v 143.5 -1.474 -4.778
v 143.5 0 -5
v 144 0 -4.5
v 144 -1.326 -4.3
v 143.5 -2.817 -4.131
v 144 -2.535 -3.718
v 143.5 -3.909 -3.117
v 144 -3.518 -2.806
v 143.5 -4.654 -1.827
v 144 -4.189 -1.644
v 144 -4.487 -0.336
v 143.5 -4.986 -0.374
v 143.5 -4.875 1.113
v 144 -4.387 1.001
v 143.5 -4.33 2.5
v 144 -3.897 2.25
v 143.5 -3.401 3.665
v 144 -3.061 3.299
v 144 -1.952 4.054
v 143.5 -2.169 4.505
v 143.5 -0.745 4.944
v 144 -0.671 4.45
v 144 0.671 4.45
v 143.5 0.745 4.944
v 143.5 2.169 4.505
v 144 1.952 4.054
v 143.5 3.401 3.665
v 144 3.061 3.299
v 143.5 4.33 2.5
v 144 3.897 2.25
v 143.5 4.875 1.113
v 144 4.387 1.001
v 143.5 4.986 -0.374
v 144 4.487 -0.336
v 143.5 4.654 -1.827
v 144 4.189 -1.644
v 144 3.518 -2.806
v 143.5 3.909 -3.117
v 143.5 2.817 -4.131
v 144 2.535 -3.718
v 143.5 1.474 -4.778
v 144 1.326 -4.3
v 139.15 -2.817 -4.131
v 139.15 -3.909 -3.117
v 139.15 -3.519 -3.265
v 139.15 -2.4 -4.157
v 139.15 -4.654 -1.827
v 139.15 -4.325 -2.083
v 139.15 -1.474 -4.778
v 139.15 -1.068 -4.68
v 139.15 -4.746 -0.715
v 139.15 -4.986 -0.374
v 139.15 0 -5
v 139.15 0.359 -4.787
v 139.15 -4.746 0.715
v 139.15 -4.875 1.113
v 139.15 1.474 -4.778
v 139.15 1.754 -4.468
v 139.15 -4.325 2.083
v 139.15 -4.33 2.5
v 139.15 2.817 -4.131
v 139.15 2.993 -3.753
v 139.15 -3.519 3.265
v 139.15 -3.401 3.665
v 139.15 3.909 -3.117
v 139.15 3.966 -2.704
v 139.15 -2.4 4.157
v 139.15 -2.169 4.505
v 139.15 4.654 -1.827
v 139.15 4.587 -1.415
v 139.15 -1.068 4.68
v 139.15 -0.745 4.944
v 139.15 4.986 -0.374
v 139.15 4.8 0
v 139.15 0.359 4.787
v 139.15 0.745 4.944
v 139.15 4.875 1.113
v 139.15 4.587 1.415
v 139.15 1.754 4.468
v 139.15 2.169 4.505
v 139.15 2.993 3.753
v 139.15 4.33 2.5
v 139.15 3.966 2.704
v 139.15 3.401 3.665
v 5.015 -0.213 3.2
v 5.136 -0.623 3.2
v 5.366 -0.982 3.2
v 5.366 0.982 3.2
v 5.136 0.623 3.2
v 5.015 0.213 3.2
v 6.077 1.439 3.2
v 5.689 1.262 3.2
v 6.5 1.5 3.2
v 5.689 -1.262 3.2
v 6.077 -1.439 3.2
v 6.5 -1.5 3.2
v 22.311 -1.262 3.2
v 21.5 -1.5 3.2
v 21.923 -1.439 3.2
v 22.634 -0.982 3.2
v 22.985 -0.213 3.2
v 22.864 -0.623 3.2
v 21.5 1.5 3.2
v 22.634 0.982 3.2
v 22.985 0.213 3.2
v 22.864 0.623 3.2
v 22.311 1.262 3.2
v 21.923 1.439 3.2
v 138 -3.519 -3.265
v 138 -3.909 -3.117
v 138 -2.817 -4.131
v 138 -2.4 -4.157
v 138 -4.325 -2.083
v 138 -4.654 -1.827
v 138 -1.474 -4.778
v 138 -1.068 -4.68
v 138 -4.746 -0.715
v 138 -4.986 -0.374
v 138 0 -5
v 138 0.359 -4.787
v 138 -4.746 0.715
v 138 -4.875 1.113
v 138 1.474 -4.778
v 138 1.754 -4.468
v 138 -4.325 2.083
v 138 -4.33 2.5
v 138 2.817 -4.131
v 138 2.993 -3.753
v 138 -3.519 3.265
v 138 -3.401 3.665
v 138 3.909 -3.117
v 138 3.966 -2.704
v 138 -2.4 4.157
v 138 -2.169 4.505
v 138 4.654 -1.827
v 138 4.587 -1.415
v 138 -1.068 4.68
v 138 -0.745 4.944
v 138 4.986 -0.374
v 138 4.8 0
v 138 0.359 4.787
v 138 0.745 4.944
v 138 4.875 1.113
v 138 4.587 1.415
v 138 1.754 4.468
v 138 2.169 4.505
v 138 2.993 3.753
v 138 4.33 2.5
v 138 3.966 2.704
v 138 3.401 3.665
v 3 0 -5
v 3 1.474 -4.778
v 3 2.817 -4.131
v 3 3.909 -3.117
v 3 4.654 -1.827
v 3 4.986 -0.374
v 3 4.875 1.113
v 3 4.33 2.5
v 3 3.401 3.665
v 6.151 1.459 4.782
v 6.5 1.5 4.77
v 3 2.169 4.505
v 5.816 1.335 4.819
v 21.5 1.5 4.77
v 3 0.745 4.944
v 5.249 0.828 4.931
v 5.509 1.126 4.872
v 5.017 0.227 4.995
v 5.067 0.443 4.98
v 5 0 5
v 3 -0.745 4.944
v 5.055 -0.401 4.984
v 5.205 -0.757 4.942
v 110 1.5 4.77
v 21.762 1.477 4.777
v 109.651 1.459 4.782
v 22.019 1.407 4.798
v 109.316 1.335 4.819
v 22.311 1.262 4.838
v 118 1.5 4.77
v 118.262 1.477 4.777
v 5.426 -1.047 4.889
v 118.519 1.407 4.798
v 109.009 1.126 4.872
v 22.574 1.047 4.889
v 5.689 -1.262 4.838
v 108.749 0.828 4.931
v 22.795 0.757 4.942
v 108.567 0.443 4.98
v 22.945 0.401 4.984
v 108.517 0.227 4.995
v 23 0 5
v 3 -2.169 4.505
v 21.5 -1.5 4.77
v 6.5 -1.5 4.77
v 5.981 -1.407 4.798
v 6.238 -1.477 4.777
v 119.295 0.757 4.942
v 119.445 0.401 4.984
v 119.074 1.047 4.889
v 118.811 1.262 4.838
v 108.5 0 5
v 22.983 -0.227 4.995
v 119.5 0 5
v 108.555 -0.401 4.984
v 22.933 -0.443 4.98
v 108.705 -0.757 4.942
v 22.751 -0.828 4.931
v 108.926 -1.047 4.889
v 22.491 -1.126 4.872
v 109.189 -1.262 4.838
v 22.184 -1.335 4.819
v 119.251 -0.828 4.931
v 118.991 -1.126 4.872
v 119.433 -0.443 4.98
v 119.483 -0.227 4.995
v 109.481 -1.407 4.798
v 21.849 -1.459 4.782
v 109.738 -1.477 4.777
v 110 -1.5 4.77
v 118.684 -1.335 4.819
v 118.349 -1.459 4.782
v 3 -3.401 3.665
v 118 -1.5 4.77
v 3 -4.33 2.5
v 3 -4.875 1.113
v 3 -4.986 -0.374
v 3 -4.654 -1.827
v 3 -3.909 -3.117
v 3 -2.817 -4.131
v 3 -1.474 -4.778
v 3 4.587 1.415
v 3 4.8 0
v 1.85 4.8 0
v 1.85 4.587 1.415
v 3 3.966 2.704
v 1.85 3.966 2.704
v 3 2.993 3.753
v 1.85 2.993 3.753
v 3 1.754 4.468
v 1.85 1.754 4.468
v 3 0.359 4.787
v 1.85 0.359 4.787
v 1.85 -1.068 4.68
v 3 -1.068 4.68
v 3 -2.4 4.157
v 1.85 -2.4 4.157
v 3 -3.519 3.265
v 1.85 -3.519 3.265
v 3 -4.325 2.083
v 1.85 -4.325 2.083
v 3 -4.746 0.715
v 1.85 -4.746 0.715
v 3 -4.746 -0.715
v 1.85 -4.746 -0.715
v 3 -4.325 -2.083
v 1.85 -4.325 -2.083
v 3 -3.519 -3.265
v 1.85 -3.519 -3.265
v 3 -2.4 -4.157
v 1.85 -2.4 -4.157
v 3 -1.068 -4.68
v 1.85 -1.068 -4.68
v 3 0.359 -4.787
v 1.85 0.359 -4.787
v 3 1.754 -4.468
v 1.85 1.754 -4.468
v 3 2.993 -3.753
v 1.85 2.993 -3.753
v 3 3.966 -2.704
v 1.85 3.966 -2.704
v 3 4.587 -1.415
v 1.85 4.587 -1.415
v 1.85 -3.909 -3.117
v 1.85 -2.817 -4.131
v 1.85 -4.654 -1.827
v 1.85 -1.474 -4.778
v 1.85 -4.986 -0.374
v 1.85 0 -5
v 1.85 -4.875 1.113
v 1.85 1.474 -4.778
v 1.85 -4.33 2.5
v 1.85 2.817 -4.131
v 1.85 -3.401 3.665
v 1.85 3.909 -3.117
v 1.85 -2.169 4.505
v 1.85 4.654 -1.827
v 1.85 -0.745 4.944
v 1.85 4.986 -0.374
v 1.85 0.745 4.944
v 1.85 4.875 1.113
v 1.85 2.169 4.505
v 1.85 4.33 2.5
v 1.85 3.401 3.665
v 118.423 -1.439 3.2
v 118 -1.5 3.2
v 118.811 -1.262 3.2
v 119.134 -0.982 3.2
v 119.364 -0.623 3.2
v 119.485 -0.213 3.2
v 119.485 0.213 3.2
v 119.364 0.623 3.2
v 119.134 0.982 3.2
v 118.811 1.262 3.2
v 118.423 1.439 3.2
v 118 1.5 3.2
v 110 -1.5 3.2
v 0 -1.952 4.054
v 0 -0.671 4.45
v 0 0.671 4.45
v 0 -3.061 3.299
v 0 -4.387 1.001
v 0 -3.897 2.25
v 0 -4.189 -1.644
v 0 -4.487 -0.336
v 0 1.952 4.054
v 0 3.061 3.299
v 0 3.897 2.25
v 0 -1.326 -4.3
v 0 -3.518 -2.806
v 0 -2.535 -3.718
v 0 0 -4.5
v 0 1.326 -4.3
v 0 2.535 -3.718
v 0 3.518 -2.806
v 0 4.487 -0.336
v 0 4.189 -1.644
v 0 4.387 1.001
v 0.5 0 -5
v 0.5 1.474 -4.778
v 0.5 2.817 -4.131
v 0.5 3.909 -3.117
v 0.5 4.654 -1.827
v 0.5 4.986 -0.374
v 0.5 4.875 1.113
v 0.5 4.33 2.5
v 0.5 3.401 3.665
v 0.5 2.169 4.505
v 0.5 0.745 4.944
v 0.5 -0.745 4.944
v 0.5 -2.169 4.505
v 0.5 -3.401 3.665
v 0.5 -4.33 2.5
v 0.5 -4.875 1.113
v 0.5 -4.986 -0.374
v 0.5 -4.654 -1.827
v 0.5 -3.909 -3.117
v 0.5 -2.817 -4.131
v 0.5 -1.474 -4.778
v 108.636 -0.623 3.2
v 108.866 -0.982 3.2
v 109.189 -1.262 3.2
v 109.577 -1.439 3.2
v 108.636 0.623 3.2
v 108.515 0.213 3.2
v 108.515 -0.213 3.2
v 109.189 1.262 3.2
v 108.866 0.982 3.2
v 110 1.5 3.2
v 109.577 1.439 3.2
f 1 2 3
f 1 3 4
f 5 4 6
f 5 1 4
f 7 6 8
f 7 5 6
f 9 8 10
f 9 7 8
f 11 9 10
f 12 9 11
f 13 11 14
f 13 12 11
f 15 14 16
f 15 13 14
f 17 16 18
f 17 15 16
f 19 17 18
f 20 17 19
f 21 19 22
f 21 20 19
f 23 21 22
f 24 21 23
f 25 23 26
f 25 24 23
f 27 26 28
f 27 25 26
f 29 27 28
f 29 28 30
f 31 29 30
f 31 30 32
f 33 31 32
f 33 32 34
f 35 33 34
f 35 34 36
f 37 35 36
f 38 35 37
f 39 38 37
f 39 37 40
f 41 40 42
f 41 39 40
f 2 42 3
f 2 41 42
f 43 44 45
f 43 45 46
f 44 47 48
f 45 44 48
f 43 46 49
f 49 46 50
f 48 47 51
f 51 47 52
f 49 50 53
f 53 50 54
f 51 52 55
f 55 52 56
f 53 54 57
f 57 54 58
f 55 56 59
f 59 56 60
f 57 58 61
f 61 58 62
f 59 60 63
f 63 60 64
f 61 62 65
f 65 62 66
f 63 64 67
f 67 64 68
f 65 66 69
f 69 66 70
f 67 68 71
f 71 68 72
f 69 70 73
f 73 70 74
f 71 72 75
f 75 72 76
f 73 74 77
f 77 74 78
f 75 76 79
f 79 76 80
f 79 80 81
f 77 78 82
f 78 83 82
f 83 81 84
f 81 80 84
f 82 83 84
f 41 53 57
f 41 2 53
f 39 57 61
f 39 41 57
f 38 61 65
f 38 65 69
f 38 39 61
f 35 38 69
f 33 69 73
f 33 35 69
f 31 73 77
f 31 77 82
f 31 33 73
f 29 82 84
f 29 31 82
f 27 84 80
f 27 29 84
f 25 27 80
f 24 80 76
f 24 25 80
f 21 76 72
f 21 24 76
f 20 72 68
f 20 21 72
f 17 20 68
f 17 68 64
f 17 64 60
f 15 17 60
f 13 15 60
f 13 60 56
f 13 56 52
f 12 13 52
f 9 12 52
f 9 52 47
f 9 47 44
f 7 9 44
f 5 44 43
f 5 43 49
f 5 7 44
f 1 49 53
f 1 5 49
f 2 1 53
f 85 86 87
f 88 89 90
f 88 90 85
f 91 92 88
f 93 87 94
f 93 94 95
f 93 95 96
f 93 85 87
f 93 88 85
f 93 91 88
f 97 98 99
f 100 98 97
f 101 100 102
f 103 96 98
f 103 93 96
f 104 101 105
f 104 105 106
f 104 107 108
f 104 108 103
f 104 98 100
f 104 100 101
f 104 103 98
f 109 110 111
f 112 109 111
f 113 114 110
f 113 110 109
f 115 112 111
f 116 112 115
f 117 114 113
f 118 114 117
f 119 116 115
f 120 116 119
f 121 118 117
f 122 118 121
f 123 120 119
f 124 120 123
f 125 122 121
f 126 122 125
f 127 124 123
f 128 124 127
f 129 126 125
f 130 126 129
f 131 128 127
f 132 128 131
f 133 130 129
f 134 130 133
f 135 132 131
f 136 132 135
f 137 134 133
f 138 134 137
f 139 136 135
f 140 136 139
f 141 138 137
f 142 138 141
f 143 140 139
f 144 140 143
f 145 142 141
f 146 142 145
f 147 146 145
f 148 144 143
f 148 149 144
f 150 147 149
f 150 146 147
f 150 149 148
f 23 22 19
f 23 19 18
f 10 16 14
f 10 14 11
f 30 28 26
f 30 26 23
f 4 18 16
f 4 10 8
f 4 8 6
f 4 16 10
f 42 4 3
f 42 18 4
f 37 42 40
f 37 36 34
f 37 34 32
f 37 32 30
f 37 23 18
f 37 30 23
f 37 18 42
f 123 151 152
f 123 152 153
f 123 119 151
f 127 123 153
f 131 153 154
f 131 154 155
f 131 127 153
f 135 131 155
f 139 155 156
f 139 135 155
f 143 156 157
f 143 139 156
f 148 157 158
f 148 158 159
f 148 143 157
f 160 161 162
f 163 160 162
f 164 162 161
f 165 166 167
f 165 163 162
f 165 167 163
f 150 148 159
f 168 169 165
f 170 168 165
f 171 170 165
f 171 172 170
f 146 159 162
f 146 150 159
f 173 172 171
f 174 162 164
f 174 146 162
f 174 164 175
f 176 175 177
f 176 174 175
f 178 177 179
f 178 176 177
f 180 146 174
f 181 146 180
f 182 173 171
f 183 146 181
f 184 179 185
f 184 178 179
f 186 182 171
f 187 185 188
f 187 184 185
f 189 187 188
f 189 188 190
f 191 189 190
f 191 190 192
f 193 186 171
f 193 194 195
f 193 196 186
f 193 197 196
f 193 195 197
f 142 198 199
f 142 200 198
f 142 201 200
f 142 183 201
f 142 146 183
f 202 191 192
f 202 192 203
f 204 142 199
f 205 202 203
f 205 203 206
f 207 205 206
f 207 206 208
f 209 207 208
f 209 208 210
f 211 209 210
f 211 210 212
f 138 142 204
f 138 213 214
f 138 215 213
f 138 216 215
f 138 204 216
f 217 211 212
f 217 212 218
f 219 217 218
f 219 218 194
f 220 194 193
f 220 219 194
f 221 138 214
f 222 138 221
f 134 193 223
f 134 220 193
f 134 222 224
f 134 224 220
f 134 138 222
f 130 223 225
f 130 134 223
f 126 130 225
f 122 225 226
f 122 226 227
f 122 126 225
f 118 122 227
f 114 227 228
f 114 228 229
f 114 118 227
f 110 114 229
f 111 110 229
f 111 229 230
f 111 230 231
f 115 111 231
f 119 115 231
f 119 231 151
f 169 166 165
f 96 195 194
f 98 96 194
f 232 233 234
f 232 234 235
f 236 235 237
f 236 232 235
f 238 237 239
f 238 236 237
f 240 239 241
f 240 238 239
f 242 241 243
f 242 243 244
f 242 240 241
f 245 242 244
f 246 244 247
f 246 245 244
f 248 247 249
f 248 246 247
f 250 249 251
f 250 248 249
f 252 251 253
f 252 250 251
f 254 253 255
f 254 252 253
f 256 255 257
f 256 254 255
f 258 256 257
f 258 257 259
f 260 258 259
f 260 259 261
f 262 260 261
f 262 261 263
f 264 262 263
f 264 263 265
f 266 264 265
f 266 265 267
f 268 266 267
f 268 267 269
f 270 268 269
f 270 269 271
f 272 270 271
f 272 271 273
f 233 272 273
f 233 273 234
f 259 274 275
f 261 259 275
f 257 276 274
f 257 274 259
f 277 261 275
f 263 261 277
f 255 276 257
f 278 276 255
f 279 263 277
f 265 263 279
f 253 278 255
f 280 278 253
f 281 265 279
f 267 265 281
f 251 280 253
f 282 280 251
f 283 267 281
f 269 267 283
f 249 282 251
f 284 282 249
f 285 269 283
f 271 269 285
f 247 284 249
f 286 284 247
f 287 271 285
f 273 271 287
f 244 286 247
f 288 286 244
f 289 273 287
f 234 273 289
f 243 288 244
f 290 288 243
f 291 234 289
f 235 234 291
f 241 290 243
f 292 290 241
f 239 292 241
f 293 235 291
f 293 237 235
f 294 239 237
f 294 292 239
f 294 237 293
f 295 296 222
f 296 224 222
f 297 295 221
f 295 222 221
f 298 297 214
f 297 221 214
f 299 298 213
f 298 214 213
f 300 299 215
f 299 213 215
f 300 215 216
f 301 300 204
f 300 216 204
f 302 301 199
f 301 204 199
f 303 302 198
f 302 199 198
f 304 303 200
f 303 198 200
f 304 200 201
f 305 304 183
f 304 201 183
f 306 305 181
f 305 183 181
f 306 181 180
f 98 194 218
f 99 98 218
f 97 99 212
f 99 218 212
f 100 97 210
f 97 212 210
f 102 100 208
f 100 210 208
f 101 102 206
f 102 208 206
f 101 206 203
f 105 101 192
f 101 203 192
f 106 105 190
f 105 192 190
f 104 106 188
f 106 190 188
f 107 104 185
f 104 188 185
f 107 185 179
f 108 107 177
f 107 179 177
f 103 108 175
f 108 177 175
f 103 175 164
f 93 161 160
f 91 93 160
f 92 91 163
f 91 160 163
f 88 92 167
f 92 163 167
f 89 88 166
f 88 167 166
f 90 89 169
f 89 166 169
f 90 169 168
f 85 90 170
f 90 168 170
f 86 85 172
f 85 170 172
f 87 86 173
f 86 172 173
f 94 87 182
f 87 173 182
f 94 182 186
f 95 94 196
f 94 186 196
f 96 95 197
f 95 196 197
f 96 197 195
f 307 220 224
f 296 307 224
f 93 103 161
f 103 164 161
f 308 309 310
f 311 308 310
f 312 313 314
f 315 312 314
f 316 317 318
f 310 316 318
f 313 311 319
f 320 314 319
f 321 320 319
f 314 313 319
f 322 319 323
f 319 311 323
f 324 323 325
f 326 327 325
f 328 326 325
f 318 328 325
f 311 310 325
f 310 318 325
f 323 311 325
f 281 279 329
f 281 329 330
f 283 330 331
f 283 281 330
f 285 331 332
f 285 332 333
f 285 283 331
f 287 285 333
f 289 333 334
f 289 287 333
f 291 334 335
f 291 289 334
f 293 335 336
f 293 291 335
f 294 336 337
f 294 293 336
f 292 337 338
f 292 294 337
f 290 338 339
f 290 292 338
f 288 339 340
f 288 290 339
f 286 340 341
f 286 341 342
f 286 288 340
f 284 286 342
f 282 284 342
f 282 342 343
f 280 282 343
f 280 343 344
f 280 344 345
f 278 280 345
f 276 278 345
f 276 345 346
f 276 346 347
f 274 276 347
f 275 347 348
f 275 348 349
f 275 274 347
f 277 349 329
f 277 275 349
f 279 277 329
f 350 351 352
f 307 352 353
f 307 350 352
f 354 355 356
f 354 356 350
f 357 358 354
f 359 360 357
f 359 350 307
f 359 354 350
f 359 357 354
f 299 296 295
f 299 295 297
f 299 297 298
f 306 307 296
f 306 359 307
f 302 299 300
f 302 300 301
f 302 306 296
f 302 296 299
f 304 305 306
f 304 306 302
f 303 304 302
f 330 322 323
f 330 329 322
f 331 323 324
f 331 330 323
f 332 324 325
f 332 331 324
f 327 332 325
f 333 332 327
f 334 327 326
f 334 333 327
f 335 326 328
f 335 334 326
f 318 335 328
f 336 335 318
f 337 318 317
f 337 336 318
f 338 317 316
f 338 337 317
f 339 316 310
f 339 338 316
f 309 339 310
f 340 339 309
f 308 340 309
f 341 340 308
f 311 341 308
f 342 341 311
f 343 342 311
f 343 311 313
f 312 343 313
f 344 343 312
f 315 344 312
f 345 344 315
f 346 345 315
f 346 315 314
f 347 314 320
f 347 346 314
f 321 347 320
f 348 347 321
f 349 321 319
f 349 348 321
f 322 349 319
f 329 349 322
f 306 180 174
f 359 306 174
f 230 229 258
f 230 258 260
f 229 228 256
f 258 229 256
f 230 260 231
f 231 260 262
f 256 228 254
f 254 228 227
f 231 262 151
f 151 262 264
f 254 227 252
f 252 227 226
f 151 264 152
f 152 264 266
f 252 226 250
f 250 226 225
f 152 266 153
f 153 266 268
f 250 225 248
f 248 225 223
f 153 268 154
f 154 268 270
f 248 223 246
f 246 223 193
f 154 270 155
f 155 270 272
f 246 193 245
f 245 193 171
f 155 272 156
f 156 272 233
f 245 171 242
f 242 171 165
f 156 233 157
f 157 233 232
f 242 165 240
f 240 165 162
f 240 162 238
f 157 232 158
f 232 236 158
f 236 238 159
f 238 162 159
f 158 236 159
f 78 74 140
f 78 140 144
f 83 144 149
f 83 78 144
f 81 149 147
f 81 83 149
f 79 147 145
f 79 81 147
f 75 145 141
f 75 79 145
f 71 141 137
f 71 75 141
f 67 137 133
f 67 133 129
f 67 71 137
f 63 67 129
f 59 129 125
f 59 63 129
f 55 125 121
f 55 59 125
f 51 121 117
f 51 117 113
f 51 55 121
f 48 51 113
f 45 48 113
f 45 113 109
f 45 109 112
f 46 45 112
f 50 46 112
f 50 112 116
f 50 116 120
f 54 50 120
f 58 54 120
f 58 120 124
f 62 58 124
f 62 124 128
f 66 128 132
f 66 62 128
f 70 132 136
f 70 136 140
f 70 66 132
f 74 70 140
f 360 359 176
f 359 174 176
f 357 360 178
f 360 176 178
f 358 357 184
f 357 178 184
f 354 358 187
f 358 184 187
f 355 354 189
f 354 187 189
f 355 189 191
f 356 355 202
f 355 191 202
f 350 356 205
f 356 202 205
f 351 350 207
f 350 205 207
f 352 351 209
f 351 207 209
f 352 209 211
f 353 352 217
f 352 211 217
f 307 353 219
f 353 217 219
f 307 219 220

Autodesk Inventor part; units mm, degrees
sketch "Sketch_1" plane through (0, 0, 0) normal (0, 1, 0) x (-1, 0, 0)
  line L0 (-144, 0) -> (0, 0)
  line L1 (0, 0) -> (0, -4.5)
  line L2 (0, -4.5) -> (-0.5, -5)
  line L3 (-0.5, -5) -> (-143.5, -5)
  line L4 (-143.5, -5) -> (-144, -4.5)
  line L5 (-144, -4.5) -> (-144, 0)
  line L6 (-144, 0) -> (0, 0)
revolve "Revolution1" add sketch "Sketch_1" angle 360 about axis through (144, 0, 0) along (1, 0, 0)
sketch "Sketch_27" plane through (0, 0, 0) normal (0, 0, 1) x (1, 0, 0)
  line L0 (144, 0) -> (-144, 0)
  line L1 (1.85, 9.6) -> (1.85, 4.8)
  line L2 (1.85, 4.8) -> (3, 4.8)
  line L3 (3, 4.8) -> (3, 9.6)
  line L4 (3, 9.6) -> (1.85, 9.6)
revolve "Revolution2" cut sketch "Sketch_27" angle 360 about axis through (144, 0, 0) along (1, 0, 0)
sketch "Sketch_39" plane through (0, 0, 0) normal (0, 0, 1) x (1, 0, 0)
  line L0 (144, 0) -> (-144, 0)
  line L1 (138, 9.6) -> (138, 4.8)
  line L2 (138, 4.8) -> (139.15, 4.8)
  line L3 (139.15, 4.8) -> (139.15, 9.6)
  line L4 (139.15, 9.6) -> (138, 9.6)
revolve "Revolution3" cut sketch "Sketch_39" angle 360 about axis through (144, 0, 0) along (1, 0, 0)
sketch "_____7" plane through (0, 0, 5) normal (0, 0, 1) x (1, 0, 0)
  arc A0 (6.5, 1.5) -> (6.5, -1.5) centre (6.5, 0) ccw
  line L0 (6.5, -1.5) -> (21.5, -1.5)
  arc A1 (21.5, -1.5) -> (21.5, 1.5) centre (21.5, 0) ccw
  line L1 (21.5, 1.5) -> (6.5, 1.5)
extrude "Extrusion1" cut sketch "_____7" against normal blind 1.8
sketch "_____10" plane through (0, 0, 5) normal (0, 0, 1) x (1, 0, 0)
  arc A0 (110, 1.5) -> (110, -1.5) centre (110, 0) ccw
  line L0 (110, -1.5) -> (118, -1.5)
  arc A1 (118, -1.5) -> (118, 1.5) centre (118, 0) ccw
  line L1 (118, 1.5) -> (110, 1.5)
extrude "Extrusion2" cut sketch "_____10" against normal blind 1.8
ref_plane "to_rring_1_XY" through (2.425, 0, 0) normal (1, 0, 0) x (0, 0, -1)
ref_plane "to_rring_1_YZ" through (2.425, 0, 0) normal (0, 0, -1) x (0, 1, 0)
ref_plane "to_rring_1_ZX" through (2.425, 0, 0) normal (0, 1, 0) x (1, 0, 0)
ref_plane "to_rring_2_XY" through (138.575, 0, 0) normal (1, 0, 0) x (0, 0, -1)
ref_plane "to_rring_2_YZ" through (138.575, 0, 0) normal (0, 0, -1) x (0, 1, 0)
ref_plane "to_rring_2_ZX" through (138.575, 0, 0) normal (0, 1, 0) x (1, 0, 0)
properties part number "NSFMKRRA10-144-F3-S6-KA5-A18-KB108.5-B11_s"
